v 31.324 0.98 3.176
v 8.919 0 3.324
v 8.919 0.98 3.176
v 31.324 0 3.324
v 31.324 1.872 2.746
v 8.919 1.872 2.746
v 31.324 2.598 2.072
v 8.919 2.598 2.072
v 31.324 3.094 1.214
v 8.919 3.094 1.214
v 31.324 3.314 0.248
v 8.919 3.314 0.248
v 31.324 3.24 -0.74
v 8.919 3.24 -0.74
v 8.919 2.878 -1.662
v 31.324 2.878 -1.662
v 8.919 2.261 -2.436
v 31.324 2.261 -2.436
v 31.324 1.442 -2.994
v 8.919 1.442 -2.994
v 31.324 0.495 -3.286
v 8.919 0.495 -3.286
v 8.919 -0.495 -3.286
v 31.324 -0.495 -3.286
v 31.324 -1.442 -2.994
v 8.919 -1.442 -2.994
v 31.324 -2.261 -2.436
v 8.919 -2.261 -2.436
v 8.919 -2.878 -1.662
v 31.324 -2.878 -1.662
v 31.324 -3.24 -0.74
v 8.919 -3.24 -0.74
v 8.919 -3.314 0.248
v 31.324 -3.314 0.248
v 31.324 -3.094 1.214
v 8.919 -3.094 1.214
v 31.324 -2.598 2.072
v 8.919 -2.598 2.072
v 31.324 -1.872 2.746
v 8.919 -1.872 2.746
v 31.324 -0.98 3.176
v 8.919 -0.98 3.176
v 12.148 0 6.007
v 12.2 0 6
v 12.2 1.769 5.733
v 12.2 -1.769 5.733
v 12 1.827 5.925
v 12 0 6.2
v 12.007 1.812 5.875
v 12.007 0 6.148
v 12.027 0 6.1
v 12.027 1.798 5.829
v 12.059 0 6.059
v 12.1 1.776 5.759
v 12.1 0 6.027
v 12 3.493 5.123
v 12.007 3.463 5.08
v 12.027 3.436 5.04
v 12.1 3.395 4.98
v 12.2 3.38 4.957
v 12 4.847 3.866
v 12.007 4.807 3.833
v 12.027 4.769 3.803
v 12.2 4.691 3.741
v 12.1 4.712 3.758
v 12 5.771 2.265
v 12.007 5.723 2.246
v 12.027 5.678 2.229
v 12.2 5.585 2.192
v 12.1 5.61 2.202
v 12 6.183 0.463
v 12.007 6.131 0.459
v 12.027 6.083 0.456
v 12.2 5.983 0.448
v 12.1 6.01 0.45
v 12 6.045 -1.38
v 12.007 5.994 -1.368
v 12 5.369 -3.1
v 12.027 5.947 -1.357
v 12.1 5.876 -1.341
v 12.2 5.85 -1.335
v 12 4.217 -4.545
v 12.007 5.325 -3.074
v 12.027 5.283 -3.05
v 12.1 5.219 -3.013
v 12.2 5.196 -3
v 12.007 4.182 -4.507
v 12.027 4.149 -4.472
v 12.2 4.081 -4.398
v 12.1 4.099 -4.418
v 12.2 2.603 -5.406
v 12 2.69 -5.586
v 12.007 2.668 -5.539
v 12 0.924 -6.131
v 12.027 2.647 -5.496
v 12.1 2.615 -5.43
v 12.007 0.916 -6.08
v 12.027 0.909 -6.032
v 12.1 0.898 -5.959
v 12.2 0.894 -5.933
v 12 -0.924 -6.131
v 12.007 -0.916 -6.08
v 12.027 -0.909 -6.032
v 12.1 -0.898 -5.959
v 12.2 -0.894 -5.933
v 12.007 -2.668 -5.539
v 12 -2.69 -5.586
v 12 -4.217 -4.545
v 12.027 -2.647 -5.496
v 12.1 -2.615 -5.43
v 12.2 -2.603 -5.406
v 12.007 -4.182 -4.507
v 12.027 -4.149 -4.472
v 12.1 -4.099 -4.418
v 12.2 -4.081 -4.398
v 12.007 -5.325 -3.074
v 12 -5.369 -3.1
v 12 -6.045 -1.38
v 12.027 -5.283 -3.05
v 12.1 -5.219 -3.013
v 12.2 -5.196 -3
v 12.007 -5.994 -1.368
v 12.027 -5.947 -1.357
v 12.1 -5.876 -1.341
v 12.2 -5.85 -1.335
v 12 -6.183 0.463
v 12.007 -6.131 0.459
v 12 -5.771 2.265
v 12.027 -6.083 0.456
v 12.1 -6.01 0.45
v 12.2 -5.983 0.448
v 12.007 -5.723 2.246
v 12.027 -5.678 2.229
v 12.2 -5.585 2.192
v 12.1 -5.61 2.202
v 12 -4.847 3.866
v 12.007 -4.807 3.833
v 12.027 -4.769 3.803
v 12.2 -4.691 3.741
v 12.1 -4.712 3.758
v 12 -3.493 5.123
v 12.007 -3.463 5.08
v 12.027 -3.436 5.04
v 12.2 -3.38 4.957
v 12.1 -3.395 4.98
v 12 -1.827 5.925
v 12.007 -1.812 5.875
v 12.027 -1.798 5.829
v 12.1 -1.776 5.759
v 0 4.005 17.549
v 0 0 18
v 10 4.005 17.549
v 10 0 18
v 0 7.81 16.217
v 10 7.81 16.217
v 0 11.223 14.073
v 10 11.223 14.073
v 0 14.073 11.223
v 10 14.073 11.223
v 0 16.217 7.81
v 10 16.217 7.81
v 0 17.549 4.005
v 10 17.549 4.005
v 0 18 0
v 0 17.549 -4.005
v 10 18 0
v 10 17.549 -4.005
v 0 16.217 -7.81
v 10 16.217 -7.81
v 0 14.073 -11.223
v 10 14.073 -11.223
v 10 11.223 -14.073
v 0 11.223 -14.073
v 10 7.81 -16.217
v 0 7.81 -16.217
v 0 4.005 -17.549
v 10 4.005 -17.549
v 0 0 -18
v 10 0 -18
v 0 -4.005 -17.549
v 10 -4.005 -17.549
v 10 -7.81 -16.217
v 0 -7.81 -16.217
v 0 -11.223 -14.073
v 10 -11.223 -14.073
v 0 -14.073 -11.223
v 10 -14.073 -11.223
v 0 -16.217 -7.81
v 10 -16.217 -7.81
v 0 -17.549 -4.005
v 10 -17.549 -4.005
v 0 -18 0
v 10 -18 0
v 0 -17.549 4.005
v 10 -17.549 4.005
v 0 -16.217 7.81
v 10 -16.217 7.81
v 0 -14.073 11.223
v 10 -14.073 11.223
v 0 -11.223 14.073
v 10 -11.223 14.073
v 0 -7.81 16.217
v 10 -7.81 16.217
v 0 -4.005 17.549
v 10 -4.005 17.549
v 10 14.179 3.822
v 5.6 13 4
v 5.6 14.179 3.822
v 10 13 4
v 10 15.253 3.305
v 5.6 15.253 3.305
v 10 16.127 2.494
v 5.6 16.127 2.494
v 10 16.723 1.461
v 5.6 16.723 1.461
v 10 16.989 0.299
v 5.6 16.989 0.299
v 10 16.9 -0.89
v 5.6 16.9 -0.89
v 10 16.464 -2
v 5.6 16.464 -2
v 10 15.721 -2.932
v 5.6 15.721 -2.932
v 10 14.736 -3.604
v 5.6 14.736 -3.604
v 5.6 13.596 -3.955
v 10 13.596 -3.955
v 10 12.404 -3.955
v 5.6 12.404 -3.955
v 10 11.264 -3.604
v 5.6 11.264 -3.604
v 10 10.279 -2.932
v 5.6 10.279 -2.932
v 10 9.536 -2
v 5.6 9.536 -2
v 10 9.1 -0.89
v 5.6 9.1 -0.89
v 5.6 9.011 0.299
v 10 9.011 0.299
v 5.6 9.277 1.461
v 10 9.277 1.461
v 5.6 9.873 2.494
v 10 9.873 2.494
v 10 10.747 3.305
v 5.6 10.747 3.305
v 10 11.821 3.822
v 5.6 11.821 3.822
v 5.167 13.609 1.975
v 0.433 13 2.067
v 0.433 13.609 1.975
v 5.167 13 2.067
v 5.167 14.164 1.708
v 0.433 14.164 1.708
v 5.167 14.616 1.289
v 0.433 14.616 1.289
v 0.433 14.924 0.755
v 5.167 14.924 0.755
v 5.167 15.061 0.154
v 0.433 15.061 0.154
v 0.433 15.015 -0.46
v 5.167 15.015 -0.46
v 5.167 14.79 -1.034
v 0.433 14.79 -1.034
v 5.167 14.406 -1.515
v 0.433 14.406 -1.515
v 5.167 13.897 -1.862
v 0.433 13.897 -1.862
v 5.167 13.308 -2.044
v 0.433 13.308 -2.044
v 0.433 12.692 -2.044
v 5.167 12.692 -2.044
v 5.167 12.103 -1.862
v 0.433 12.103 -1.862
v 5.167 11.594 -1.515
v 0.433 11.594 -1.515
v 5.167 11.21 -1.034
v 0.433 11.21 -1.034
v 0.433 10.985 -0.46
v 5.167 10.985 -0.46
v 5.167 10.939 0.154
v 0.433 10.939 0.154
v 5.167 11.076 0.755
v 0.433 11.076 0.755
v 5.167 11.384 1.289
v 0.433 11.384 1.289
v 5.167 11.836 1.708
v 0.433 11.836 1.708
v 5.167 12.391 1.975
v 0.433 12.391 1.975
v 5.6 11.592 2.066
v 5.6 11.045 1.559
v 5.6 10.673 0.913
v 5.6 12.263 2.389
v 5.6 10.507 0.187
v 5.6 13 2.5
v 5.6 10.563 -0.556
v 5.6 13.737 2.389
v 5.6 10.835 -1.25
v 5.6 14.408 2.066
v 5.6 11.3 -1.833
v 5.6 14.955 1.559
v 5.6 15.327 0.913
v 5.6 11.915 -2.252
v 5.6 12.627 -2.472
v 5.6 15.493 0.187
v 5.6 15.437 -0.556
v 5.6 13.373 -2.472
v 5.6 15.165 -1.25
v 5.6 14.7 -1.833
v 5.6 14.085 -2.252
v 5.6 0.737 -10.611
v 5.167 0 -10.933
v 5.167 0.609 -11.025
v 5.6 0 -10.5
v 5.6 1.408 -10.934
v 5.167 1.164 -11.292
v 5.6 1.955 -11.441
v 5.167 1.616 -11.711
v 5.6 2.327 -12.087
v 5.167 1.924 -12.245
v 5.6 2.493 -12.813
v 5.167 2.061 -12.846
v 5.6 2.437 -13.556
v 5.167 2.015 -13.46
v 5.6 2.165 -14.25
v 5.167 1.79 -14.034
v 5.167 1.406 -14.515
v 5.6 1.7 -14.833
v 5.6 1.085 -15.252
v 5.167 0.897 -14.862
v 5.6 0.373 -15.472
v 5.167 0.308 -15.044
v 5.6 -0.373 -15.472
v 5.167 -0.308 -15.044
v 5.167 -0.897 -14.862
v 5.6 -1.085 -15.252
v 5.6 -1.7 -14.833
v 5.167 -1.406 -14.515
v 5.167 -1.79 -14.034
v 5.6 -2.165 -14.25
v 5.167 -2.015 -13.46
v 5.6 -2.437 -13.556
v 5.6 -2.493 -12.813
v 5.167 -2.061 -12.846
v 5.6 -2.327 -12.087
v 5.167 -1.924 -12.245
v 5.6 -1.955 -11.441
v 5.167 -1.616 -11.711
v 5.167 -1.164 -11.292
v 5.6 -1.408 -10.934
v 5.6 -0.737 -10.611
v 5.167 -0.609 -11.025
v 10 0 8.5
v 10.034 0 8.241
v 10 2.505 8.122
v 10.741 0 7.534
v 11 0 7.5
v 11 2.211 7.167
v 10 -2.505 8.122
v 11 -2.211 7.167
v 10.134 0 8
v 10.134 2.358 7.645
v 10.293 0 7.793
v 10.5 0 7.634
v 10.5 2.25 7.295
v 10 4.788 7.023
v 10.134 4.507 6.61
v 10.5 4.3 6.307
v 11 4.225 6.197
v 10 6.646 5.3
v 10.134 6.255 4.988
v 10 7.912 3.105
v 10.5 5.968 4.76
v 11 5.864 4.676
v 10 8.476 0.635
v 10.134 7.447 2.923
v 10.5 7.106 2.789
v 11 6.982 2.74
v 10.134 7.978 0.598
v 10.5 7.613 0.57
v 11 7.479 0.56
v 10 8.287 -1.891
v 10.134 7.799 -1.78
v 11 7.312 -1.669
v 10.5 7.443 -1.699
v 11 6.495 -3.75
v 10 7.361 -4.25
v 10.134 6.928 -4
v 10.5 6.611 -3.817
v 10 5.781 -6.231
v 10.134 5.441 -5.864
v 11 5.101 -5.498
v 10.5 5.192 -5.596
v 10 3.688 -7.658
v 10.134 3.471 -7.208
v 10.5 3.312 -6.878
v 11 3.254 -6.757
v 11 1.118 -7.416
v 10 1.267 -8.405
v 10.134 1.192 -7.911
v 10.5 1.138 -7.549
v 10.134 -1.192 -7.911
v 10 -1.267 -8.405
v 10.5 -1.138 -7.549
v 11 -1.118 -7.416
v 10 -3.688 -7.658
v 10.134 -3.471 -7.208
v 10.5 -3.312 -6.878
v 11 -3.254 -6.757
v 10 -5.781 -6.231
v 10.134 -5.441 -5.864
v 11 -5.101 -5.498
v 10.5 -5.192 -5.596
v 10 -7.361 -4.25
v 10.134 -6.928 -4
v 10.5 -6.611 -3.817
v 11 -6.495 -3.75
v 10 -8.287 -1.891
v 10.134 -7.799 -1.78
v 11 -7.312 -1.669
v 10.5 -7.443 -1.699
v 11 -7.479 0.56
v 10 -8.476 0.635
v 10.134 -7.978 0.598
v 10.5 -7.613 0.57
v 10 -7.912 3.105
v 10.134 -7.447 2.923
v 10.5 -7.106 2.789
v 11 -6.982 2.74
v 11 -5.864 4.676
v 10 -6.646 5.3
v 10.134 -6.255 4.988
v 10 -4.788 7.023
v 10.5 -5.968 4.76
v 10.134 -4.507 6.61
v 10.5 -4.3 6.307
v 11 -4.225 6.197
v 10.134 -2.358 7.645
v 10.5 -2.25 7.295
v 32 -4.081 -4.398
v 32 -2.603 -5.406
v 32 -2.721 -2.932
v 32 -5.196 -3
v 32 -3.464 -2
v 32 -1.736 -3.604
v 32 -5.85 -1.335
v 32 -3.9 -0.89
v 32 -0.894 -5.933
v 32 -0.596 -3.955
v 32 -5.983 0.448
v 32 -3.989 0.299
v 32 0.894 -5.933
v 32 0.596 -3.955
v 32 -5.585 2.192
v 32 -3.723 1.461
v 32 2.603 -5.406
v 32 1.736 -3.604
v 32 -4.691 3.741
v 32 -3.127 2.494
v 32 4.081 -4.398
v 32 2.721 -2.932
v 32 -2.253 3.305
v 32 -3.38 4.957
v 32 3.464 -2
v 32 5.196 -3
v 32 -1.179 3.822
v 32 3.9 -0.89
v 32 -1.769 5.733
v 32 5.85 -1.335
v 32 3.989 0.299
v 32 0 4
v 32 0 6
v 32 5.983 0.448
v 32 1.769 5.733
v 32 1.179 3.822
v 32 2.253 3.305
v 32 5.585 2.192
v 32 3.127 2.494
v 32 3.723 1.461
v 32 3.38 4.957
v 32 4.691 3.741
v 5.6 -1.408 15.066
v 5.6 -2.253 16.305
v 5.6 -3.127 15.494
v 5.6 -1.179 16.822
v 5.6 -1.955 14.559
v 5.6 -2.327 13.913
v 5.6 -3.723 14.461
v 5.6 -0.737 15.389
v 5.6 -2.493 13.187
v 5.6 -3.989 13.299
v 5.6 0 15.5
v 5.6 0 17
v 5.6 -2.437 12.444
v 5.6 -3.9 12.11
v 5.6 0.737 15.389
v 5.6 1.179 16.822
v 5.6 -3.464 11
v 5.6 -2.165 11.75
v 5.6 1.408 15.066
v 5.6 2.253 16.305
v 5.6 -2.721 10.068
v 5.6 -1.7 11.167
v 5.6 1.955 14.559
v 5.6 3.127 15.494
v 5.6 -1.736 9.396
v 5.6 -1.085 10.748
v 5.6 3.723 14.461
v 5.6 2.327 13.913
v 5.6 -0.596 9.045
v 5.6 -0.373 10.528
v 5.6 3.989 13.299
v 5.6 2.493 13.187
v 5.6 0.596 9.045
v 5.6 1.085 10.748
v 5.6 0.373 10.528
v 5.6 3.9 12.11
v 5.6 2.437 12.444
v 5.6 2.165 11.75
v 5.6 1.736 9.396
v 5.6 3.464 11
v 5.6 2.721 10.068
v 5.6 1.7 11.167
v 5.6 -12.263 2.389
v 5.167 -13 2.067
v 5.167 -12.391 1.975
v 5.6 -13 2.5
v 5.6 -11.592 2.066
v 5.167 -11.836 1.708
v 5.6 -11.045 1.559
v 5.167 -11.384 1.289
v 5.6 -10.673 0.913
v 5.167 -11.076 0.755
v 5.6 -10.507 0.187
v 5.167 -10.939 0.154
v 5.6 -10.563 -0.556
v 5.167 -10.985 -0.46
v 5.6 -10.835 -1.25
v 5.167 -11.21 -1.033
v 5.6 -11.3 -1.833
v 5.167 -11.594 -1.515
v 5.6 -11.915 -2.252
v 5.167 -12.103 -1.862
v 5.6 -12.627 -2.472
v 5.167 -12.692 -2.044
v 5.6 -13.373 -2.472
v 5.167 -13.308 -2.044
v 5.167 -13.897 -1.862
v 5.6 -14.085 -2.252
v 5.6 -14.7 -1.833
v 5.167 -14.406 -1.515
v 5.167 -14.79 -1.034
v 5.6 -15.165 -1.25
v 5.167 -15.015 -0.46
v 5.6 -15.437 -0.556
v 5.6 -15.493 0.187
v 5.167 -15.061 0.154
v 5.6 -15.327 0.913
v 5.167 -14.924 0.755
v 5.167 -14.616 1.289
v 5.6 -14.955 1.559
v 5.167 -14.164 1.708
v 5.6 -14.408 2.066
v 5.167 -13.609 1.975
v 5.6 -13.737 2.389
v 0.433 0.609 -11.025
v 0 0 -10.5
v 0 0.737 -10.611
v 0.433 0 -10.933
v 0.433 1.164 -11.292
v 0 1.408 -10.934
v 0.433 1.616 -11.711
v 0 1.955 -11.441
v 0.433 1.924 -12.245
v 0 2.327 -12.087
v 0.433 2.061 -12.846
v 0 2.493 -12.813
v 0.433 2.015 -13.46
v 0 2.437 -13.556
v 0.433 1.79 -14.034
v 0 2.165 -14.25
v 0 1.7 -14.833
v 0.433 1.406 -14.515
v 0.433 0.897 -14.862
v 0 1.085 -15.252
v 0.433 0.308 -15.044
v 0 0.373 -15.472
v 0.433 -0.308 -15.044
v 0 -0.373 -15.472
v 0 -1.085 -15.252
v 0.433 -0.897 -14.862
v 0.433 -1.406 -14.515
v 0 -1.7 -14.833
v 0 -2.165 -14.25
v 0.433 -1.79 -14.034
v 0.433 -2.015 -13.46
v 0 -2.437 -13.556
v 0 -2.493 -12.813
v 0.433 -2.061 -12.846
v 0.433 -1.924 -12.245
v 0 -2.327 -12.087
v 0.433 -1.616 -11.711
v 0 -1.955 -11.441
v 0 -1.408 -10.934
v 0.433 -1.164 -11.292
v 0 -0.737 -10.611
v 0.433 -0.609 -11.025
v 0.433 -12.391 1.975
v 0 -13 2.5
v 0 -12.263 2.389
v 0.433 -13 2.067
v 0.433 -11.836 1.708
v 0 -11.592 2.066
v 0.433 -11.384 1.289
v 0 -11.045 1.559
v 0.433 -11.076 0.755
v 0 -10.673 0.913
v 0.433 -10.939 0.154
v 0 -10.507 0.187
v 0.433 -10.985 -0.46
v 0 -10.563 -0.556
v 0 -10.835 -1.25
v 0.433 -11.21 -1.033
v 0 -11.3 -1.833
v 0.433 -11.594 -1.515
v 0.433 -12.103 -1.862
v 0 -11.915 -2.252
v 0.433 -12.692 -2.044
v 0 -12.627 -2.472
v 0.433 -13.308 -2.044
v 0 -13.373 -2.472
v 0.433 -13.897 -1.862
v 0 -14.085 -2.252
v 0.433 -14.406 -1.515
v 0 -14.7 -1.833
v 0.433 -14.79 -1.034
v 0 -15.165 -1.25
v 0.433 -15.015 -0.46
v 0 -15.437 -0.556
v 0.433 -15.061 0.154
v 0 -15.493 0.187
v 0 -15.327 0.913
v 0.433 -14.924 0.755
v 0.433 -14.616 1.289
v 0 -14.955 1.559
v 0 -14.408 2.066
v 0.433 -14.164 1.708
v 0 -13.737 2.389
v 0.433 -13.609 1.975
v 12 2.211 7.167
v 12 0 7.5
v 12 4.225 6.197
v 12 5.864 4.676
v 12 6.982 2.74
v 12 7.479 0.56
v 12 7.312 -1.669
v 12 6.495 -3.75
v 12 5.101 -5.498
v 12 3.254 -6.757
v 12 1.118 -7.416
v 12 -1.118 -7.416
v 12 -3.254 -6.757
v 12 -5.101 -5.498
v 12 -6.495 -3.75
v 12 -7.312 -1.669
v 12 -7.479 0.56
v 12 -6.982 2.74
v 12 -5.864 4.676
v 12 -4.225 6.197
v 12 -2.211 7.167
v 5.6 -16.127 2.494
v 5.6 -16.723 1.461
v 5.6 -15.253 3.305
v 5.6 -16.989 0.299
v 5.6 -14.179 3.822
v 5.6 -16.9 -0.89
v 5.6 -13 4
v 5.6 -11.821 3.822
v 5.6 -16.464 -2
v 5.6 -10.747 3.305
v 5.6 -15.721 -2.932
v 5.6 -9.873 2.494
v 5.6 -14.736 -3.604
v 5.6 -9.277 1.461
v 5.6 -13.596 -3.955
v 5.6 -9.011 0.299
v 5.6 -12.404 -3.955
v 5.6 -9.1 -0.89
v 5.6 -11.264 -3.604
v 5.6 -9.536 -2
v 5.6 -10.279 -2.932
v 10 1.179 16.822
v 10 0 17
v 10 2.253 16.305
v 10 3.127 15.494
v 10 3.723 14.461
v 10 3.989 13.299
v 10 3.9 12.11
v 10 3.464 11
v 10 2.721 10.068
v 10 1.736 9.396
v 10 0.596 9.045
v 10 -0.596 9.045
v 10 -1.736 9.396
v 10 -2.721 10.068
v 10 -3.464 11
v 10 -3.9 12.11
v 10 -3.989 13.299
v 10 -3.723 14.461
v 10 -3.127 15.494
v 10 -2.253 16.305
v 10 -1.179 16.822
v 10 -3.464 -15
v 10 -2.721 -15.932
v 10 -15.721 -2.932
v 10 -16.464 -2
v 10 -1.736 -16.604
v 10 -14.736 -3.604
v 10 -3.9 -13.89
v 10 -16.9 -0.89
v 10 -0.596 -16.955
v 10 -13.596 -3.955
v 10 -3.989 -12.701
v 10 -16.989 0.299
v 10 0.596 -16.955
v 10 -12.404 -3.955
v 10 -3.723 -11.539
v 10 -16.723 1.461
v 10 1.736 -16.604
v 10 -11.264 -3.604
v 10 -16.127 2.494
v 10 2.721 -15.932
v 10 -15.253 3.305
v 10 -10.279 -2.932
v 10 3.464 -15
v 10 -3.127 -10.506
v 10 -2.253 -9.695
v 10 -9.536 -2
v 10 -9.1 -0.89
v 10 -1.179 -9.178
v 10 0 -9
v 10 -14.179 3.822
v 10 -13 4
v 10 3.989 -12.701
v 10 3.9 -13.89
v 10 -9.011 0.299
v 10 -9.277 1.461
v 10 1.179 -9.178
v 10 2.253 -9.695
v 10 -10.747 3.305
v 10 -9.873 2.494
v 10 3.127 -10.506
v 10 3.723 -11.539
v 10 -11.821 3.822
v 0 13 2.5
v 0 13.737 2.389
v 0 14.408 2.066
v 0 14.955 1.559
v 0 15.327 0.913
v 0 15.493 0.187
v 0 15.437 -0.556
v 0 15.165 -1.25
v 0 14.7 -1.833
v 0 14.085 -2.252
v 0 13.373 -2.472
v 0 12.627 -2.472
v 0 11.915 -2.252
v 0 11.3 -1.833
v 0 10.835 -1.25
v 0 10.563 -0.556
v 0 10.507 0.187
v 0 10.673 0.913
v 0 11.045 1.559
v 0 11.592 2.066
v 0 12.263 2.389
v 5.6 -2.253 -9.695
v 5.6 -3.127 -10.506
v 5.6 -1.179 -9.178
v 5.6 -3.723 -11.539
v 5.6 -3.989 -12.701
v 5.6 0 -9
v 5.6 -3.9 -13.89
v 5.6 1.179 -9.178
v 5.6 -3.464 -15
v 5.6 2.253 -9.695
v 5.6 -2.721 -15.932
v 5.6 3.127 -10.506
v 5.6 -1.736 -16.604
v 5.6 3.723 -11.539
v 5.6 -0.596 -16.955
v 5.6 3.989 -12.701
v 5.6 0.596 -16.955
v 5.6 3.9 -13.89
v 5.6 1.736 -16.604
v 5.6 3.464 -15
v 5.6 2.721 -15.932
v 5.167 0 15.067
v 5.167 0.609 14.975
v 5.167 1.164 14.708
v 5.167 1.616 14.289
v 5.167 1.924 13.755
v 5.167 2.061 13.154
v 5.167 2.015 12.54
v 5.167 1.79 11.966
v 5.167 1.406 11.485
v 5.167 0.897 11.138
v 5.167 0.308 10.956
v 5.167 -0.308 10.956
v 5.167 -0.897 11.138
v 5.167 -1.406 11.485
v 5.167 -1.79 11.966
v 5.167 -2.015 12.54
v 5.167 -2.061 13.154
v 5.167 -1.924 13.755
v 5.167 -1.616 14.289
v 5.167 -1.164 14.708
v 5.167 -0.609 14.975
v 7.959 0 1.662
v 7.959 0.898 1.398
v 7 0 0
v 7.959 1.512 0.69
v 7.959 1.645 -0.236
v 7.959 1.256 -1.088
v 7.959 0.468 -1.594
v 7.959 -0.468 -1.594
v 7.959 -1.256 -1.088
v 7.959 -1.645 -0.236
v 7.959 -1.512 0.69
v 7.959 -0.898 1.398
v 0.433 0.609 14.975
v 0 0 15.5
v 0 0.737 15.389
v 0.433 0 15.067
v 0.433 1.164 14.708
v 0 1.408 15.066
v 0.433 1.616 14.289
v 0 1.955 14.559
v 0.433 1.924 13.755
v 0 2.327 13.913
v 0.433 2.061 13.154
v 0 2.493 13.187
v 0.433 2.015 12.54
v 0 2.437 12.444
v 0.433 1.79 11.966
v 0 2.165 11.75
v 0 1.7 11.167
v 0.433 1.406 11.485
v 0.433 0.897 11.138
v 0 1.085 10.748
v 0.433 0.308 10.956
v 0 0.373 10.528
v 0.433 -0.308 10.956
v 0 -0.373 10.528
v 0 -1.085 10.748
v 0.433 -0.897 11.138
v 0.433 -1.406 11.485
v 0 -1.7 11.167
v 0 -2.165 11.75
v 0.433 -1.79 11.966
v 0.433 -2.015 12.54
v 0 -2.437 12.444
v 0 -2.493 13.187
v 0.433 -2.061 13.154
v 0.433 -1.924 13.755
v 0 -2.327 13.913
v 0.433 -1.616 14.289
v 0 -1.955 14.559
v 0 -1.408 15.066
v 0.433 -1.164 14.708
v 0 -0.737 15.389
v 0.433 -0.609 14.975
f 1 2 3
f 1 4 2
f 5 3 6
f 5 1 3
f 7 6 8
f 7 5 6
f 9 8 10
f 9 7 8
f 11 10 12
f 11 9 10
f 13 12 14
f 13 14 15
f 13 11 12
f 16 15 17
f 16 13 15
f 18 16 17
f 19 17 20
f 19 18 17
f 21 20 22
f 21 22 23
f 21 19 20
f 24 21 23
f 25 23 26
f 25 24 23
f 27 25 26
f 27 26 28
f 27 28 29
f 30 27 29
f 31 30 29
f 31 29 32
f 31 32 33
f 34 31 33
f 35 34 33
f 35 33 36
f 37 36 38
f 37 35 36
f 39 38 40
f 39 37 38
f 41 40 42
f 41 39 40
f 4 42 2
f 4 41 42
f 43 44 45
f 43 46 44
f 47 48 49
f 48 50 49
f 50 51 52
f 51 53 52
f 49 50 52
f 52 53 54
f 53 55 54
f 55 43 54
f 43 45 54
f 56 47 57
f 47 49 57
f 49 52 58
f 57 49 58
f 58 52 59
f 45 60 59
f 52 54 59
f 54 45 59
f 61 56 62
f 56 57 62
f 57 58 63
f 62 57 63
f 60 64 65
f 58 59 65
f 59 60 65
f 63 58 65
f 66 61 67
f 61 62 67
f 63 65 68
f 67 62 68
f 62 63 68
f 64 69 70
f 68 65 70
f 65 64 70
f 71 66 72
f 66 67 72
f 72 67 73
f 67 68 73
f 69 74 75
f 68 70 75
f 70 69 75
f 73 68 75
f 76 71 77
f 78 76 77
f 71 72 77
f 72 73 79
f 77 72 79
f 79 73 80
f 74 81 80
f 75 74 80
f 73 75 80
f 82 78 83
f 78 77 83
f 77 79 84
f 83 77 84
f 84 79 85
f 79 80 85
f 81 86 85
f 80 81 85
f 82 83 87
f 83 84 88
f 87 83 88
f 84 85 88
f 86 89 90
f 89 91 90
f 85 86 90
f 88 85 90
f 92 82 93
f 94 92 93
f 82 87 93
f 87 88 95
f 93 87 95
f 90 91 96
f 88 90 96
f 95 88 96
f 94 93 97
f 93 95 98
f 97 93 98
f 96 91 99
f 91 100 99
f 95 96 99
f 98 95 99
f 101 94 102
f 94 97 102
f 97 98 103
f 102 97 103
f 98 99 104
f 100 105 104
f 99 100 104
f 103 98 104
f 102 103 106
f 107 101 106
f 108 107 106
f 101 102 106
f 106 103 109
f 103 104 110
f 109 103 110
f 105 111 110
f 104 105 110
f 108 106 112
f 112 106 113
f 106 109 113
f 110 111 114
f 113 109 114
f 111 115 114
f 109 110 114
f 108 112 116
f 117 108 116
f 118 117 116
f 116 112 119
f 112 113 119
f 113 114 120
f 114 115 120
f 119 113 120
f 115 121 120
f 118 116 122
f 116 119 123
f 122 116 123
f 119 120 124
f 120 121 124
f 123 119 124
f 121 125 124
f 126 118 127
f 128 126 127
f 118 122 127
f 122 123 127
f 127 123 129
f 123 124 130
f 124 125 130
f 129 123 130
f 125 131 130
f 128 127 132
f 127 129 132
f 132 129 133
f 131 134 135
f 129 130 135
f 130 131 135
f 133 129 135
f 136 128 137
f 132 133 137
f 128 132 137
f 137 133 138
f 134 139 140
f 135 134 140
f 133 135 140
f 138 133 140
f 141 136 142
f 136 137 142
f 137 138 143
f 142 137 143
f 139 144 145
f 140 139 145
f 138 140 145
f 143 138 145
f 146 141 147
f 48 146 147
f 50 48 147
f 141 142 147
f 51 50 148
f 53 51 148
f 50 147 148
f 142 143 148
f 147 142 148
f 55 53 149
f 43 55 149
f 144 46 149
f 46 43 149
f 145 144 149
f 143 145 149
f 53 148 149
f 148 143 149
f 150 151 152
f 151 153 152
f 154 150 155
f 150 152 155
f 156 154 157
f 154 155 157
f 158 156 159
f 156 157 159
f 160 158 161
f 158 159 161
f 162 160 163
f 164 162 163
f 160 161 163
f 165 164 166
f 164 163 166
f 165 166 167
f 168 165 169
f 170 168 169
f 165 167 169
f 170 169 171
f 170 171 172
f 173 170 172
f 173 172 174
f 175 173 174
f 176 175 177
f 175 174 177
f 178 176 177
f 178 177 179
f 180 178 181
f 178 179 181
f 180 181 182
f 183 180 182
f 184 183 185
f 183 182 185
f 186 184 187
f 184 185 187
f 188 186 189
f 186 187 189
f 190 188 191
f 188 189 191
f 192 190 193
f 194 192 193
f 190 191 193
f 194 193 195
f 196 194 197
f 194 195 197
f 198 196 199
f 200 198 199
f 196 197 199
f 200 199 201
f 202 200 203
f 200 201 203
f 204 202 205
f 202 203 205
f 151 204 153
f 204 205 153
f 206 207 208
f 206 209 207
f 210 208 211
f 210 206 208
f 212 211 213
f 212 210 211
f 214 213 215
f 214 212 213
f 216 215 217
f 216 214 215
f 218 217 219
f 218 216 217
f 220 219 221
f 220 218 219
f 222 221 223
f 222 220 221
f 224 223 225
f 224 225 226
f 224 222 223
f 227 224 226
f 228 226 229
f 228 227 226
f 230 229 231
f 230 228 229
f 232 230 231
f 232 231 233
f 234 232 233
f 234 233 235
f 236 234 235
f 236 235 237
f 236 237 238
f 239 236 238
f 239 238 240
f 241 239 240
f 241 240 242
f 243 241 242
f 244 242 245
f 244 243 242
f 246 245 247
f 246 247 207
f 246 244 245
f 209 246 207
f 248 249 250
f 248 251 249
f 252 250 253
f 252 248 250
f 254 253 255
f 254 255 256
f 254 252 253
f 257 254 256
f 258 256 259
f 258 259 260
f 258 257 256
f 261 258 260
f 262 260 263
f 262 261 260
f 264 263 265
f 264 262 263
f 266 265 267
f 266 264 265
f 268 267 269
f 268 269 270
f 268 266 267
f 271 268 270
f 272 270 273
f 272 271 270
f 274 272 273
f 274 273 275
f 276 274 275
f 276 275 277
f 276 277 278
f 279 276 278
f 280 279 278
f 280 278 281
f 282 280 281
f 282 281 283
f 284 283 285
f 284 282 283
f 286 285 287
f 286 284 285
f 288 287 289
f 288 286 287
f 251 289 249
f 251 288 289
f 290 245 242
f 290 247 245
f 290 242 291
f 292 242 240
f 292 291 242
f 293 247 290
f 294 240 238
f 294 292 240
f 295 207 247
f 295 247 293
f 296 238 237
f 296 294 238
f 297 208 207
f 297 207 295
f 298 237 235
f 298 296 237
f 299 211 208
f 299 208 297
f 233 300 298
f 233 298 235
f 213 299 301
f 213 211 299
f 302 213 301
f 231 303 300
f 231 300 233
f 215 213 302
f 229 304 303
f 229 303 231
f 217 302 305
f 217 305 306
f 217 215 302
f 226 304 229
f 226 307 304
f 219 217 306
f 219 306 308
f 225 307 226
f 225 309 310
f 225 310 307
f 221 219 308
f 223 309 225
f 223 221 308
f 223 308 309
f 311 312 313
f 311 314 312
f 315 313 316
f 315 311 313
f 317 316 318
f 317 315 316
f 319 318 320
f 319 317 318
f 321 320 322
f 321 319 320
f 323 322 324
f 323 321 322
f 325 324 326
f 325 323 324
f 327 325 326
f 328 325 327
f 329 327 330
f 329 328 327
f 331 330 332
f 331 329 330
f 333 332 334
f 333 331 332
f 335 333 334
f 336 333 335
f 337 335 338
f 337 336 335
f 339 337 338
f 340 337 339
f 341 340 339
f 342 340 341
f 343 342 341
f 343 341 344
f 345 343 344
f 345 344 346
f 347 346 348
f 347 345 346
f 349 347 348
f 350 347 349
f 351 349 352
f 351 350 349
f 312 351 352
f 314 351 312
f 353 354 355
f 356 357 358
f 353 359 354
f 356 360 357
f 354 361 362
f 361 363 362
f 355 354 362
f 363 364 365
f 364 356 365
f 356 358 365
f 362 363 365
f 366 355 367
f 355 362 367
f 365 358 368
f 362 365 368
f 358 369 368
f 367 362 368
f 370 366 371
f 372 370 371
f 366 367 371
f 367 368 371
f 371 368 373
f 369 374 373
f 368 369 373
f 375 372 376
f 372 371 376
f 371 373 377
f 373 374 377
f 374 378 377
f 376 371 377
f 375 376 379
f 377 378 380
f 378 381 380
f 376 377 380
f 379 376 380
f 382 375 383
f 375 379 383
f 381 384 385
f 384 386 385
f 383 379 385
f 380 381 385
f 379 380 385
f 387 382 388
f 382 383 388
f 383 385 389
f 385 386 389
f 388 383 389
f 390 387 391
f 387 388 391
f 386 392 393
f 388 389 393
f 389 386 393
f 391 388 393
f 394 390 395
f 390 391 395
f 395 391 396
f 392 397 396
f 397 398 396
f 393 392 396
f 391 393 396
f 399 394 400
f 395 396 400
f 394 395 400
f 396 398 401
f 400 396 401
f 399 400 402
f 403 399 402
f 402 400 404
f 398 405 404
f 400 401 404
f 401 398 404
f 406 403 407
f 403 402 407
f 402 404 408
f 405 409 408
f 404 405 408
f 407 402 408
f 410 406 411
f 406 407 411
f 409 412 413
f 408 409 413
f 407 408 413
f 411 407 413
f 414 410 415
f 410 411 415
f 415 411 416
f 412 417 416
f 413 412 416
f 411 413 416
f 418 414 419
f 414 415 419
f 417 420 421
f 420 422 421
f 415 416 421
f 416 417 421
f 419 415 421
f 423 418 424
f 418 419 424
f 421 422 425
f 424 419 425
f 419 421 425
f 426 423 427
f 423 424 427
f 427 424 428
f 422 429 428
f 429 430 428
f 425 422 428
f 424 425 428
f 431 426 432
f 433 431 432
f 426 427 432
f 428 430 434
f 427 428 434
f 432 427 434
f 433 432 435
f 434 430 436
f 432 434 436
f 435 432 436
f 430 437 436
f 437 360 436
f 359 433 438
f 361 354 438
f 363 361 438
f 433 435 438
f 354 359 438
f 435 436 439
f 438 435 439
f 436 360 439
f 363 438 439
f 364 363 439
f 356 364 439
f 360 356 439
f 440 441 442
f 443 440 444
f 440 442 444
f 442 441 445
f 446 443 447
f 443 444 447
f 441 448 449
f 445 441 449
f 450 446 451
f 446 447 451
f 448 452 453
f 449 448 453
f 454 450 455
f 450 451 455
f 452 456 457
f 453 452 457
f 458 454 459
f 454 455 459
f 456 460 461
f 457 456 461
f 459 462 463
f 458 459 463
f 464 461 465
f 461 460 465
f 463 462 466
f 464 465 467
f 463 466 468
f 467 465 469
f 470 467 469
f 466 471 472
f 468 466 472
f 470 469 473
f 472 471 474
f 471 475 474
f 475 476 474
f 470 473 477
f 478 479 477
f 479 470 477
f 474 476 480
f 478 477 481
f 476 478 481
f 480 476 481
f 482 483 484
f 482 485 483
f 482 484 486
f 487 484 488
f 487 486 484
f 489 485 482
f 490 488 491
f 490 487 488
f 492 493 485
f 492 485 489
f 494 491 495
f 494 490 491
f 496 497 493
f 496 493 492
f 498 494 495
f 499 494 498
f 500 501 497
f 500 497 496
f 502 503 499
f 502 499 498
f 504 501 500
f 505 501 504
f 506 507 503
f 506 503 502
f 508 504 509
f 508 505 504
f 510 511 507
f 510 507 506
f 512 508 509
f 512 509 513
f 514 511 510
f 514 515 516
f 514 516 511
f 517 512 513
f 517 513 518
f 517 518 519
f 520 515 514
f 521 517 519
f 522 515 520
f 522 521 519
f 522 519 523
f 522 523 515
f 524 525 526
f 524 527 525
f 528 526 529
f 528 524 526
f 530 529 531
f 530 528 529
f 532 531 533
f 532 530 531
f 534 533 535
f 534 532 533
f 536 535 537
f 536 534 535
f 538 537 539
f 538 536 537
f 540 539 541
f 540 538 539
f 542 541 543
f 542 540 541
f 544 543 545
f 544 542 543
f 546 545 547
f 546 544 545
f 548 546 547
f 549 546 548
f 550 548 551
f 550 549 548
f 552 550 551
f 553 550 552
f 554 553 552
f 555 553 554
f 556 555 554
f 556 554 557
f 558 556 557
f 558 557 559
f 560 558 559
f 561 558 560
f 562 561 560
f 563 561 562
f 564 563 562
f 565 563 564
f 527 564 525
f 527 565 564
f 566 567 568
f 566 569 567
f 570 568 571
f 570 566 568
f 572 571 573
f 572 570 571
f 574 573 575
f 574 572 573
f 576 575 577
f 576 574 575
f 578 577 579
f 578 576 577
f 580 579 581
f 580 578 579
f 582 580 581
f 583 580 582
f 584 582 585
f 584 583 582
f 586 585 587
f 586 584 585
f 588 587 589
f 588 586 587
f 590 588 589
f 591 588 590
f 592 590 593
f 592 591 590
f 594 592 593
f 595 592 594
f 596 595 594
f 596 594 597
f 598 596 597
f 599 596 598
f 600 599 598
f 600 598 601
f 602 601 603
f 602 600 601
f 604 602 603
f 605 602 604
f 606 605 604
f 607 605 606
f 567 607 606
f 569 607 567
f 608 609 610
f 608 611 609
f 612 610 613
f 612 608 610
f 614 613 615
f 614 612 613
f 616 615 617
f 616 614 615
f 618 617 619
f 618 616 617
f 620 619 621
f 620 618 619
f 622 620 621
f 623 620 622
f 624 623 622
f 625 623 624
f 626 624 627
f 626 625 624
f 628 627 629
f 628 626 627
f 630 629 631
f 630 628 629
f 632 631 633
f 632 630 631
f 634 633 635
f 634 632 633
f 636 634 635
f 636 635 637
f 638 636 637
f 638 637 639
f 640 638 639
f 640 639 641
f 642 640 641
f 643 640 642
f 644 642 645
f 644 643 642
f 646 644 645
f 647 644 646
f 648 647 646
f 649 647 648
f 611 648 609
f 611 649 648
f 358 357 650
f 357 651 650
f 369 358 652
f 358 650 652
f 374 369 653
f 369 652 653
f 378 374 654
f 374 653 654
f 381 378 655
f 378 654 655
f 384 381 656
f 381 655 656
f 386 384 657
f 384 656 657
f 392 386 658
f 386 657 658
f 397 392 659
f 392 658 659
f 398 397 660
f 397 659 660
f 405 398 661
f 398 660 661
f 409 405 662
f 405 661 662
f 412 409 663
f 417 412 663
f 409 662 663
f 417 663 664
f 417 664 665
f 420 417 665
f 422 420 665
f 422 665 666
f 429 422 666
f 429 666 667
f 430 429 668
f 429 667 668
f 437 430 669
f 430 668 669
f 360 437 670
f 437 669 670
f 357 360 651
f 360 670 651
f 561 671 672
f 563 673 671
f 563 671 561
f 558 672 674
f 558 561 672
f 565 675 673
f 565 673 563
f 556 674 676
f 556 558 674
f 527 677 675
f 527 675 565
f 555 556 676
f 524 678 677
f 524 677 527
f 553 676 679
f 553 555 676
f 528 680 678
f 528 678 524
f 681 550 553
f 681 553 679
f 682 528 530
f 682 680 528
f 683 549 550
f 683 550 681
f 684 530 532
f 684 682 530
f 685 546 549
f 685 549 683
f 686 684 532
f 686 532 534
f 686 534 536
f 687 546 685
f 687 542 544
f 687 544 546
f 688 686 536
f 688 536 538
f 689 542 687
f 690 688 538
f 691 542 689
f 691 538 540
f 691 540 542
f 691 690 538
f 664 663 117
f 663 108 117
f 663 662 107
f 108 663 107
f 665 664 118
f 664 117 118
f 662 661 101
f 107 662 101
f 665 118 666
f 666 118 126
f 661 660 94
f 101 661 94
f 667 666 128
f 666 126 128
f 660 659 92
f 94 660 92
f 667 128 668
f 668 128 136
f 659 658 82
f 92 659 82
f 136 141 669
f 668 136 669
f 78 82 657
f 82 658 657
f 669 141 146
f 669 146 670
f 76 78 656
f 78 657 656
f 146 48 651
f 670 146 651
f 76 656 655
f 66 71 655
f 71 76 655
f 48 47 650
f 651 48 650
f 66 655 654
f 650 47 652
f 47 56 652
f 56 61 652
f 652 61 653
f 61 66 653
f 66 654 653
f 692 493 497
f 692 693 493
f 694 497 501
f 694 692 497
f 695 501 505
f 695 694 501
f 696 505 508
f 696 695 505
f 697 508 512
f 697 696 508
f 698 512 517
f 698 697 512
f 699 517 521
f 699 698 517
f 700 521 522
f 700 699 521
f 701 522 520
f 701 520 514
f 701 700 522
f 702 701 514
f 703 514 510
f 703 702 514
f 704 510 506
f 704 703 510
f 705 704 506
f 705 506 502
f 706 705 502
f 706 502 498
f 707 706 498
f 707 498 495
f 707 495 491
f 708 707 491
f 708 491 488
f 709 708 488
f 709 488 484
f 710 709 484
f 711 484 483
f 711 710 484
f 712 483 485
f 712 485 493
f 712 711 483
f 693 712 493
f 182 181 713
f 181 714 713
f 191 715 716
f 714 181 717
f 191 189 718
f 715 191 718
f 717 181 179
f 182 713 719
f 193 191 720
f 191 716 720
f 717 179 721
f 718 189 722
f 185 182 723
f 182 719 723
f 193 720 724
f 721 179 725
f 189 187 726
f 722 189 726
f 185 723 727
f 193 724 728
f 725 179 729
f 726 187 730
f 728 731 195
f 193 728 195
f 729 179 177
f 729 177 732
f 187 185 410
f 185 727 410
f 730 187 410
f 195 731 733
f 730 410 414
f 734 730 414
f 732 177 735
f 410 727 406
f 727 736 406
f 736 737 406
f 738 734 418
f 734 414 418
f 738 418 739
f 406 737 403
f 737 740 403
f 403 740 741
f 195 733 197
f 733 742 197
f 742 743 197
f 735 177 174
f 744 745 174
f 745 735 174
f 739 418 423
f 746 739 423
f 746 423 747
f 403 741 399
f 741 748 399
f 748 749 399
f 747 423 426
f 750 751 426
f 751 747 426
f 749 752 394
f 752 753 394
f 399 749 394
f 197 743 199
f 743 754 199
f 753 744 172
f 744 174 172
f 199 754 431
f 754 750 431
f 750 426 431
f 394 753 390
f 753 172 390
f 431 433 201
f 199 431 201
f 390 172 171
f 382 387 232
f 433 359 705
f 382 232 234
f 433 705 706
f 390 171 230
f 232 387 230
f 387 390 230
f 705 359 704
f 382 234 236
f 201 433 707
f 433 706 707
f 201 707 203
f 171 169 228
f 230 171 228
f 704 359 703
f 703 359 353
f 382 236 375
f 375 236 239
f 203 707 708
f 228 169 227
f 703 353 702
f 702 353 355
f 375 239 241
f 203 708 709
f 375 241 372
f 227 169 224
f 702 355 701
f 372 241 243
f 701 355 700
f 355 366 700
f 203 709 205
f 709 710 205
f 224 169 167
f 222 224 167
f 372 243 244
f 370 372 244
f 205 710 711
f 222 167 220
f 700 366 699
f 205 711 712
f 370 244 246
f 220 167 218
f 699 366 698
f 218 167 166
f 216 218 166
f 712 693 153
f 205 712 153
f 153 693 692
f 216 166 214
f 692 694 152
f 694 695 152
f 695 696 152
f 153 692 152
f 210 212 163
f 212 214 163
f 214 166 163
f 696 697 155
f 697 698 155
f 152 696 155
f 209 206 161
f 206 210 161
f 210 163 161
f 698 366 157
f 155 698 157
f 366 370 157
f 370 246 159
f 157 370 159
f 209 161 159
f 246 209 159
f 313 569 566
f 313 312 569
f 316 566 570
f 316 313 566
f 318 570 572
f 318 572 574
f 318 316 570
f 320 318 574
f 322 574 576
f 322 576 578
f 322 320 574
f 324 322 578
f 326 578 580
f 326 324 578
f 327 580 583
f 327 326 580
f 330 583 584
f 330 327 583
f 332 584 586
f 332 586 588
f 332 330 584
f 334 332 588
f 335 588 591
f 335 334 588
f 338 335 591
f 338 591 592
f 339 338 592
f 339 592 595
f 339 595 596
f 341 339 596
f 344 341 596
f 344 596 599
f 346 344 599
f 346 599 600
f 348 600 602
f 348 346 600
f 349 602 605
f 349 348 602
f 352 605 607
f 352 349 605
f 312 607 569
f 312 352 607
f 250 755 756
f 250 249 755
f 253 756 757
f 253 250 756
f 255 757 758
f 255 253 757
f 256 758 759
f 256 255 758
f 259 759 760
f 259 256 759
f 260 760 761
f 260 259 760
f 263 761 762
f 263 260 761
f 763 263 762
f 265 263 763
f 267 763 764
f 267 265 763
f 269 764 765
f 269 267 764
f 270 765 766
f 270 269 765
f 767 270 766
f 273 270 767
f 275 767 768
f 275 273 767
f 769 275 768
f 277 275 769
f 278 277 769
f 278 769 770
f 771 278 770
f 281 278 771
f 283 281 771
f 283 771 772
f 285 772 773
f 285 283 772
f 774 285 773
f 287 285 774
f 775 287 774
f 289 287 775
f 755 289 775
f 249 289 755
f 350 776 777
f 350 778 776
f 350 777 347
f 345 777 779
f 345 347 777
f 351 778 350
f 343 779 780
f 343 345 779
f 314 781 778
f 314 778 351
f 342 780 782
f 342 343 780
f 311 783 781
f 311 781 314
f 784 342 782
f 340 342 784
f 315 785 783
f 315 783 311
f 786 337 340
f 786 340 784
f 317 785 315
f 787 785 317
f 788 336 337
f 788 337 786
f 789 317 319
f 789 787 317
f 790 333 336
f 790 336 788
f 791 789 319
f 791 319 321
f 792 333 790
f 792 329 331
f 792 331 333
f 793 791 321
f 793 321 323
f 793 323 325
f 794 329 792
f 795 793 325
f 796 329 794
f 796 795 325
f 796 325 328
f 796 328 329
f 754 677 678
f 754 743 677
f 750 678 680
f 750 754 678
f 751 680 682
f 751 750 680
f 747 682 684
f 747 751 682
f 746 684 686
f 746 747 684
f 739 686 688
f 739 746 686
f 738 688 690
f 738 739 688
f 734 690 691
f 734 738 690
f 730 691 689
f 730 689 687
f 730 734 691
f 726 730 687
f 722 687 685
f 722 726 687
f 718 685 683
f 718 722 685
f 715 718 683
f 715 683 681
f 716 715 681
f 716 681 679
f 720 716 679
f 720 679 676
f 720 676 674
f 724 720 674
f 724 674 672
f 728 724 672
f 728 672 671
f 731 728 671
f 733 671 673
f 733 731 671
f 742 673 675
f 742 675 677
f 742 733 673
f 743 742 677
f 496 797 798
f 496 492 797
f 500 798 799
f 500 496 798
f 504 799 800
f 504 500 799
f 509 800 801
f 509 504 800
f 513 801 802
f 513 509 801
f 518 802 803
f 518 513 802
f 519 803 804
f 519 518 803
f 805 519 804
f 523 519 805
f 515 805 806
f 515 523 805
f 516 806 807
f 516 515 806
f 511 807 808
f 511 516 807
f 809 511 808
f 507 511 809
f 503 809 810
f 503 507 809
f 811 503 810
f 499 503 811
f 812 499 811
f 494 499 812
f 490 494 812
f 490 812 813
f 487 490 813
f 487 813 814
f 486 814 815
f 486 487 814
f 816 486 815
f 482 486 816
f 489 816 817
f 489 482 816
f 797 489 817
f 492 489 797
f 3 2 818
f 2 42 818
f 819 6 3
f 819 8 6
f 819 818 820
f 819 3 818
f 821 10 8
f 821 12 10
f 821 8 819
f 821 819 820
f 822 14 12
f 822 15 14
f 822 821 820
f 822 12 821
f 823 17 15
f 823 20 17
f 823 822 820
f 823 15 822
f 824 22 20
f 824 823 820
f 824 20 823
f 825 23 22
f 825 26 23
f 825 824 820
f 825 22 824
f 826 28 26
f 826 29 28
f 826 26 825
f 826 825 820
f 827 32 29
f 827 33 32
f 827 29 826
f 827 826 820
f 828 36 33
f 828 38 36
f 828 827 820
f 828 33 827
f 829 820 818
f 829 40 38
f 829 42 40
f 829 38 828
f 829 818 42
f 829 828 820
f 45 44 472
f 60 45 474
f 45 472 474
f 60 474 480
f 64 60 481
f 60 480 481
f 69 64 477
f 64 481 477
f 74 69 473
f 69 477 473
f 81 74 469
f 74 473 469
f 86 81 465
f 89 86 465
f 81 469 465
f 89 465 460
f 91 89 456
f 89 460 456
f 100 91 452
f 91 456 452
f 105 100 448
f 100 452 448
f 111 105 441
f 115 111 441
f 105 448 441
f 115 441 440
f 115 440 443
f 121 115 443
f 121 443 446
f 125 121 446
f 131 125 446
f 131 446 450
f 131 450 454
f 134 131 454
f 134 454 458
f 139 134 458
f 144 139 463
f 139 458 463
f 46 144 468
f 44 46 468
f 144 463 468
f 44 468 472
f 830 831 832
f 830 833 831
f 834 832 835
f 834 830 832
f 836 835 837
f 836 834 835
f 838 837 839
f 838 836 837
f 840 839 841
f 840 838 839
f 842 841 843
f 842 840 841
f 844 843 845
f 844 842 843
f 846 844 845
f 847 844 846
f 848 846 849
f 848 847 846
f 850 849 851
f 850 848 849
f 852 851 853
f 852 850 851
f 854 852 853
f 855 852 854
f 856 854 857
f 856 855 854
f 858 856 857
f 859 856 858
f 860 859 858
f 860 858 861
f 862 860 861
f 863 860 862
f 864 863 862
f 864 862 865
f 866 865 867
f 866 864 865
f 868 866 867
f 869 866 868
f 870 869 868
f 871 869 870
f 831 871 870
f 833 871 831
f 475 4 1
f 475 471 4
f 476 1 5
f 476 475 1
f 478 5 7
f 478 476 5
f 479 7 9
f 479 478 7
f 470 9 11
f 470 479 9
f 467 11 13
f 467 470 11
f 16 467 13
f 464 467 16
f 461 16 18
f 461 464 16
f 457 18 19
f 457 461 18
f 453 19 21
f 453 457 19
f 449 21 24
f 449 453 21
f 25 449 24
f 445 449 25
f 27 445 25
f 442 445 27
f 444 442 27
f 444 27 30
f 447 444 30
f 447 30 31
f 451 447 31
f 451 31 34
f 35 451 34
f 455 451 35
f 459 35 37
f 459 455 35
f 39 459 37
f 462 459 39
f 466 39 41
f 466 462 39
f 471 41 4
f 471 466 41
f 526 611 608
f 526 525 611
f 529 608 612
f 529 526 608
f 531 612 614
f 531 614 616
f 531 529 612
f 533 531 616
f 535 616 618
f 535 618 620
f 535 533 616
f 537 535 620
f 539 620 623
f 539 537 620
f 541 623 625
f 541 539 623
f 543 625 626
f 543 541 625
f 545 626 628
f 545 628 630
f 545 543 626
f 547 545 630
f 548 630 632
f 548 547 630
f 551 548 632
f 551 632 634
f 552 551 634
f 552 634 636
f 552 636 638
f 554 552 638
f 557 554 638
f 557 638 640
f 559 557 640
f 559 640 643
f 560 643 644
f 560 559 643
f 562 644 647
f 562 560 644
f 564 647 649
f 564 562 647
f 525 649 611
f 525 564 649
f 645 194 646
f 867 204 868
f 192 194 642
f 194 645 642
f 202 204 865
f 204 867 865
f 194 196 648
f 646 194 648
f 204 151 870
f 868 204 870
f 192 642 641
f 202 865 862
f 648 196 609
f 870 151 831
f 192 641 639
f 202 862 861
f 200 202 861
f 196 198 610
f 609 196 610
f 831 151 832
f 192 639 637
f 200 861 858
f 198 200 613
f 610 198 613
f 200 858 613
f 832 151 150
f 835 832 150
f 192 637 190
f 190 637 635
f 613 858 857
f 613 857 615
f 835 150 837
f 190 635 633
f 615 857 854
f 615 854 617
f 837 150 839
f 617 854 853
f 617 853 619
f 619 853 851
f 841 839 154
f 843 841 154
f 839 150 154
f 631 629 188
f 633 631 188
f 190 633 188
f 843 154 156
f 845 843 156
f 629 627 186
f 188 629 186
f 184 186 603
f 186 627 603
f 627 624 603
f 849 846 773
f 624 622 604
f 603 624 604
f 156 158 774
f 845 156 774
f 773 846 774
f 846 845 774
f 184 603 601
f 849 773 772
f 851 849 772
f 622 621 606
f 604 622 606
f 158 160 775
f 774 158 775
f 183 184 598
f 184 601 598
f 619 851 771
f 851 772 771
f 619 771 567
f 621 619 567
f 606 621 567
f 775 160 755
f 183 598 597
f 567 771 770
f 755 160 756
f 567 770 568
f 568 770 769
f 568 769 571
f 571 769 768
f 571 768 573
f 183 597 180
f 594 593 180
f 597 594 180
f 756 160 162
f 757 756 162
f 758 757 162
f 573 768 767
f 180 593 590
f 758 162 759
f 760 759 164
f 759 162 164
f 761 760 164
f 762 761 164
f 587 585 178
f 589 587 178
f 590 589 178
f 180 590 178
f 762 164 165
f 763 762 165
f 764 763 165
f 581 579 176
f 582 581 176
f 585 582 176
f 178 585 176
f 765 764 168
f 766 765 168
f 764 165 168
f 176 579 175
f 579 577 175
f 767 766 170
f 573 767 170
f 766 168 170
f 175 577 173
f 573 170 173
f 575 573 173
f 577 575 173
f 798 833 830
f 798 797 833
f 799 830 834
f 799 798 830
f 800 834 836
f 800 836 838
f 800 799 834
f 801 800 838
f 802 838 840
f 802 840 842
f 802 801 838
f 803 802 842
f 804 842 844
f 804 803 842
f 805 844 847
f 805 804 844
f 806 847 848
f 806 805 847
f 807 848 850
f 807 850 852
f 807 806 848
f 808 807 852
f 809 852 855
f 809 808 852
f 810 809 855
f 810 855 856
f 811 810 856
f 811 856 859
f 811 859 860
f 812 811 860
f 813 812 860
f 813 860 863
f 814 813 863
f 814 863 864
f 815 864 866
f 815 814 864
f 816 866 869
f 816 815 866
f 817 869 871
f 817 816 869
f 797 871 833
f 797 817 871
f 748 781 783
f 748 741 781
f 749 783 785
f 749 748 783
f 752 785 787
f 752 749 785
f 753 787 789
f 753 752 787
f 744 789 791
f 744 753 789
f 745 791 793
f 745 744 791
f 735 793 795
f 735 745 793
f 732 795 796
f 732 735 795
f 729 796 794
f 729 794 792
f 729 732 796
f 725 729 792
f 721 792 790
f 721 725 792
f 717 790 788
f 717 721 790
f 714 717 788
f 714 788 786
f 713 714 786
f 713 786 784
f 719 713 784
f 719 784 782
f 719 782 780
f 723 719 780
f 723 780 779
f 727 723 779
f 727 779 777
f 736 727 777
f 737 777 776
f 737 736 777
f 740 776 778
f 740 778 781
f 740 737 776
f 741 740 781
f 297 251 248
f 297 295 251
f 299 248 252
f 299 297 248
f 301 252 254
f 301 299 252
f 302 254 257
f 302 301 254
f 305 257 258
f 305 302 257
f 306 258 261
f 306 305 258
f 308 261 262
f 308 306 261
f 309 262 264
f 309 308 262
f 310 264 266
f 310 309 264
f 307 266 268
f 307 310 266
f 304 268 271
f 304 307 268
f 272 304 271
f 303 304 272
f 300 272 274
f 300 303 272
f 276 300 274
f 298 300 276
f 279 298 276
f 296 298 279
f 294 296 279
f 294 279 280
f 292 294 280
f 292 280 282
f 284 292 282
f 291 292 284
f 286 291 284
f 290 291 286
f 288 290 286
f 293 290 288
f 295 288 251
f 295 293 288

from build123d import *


with BuildPart() as part:
    # Sketch1 → Revolve1 (revolve)
    with BuildSketch(Plane.XY, mode=Mode.PRIVATE) as revolve1_sk:
        with BuildLine():
            Line((0, 0), (0, 18))
            Line((0, 18), (10, 18))
            Line((10, 18), (10, 8.5))
            ThreePointArc((10, 8.5), (10.292893219, 7.792893219), (11, 7.5))
            Line((11, 7.5), (12, 7.5))
            Line((12, 7.5), (12, 6.2))
            ThreePointArc((12, 6.2), (12.058578644, 6.058578644), (12.2, 6))
            Line((12.2, 6), (32, 6))
            Line((32, 6), (32, 0))
            Line((32, 0), (0, 0))
        make_face()
    revolve(revolve1_sk.sketch.rotate(Axis((32, 0, 0), (-1, 0, 0)), 270), axis=Axis((32, 0, 0), (-1, 0, 0)))

    # Sketch2 → Cut-Revolve1 (revolve, cut)
    with BuildSketch(Plane.XY, mode=Mode.PRIVATE) as cut_revolve1_sk:
        Polygon((0, 13), (0, 15.5), (0.433, 15.067), (5.167, 15.067), (5.6, 15.5), (5.6, 17), (10, 17), (10, 13), align=None)
    revolve(cut_revolve1_sk.sketch.rotate(Axis((10, 13, 0), (-1, 0, 0)), 270), axis=Axis((10, 13, 0), (-1, 0, 0)), mode=Mode.SUBTRACT)

    # Sketch3 → Cut-Revolve2 (revolve, cut)
    with BuildSketch(Plane.XY.offset(13), mode=Mode.PRIVATE) as cut_revolve2_sk:
        Polygon((0, 0), (0, 2.5), (0.433, 2.067), (5.167, 2.067), (5.6, 2.5), (5.6, 4), (10, 4), (10, 0), align=None)
    revolve(cut_revolve2_sk.sketch.rotate(Axis((10, 0, 13), (-1, 0, 0)), 270), axis=Axis((10, 0, 13), (-1, 0, 0)), mode=Mode.SUBTRACT)

    # Sketch4 → Cut-Revolve3 (revolve, cut)
    with BuildSketch(Plane.XY, mode=Mode.PRIVATE) as cut_revolve3_sk:
        Polygon((0, -13), (0, -10.5), (0.433, -10.933), (5.167, -10.933), (5.6, -10.5), (5.6, -9), (10, -9), (10, -13), align=None)
    revolve(cut_revolve3_sk.sketch.rotate(Axis((10, -13, 0), (-1, 0, 0)), 270), axis=Axis((10, -13, 0), (-1, 0, 0)), mode=Mode.SUBTRACT)

    # Sketch5 → Cut-Revolve4 (revolve, cut)
    with BuildSketch(Plane.XY.offset(-13), mode=Mode.PRIVATE) as cut_revolve4_sk:
        Polygon((0, 0), (0, 2.5), (0.433, 2.067), (5.167, 2.067), (5.6, 2.5), (5.6, 4), (10, 4), (10, 0), align=None)
    revolve(cut_revolve4_sk.sketch.rotate(Axis((10, 0, -13), (-1, 0, 0)), 270), axis=Axis((10, 0, -13), (-1, 0, 0)), mode=Mode.SUBTRACT)

    # Sketch6 → Cut-Revolve5 (revolve, cut)
    with BuildSketch(Plane.XY, mode=Mode.PRIVATE) as cut_revolve5_sk:
        Polygon((7, 0), (8.91882362, 3.3235), (31.3235, 3.3235), (32, 4), (32, 0), align=None)
    revolve(cut_revolve5_sk.sketch.rotate(Axis((32, 0, 0), (-1, 0, 0)), 270), axis=Axis((32, 0, 0), (-1, 0, 0)), mode=Mode.SUBTRACT)


solid = part.part
